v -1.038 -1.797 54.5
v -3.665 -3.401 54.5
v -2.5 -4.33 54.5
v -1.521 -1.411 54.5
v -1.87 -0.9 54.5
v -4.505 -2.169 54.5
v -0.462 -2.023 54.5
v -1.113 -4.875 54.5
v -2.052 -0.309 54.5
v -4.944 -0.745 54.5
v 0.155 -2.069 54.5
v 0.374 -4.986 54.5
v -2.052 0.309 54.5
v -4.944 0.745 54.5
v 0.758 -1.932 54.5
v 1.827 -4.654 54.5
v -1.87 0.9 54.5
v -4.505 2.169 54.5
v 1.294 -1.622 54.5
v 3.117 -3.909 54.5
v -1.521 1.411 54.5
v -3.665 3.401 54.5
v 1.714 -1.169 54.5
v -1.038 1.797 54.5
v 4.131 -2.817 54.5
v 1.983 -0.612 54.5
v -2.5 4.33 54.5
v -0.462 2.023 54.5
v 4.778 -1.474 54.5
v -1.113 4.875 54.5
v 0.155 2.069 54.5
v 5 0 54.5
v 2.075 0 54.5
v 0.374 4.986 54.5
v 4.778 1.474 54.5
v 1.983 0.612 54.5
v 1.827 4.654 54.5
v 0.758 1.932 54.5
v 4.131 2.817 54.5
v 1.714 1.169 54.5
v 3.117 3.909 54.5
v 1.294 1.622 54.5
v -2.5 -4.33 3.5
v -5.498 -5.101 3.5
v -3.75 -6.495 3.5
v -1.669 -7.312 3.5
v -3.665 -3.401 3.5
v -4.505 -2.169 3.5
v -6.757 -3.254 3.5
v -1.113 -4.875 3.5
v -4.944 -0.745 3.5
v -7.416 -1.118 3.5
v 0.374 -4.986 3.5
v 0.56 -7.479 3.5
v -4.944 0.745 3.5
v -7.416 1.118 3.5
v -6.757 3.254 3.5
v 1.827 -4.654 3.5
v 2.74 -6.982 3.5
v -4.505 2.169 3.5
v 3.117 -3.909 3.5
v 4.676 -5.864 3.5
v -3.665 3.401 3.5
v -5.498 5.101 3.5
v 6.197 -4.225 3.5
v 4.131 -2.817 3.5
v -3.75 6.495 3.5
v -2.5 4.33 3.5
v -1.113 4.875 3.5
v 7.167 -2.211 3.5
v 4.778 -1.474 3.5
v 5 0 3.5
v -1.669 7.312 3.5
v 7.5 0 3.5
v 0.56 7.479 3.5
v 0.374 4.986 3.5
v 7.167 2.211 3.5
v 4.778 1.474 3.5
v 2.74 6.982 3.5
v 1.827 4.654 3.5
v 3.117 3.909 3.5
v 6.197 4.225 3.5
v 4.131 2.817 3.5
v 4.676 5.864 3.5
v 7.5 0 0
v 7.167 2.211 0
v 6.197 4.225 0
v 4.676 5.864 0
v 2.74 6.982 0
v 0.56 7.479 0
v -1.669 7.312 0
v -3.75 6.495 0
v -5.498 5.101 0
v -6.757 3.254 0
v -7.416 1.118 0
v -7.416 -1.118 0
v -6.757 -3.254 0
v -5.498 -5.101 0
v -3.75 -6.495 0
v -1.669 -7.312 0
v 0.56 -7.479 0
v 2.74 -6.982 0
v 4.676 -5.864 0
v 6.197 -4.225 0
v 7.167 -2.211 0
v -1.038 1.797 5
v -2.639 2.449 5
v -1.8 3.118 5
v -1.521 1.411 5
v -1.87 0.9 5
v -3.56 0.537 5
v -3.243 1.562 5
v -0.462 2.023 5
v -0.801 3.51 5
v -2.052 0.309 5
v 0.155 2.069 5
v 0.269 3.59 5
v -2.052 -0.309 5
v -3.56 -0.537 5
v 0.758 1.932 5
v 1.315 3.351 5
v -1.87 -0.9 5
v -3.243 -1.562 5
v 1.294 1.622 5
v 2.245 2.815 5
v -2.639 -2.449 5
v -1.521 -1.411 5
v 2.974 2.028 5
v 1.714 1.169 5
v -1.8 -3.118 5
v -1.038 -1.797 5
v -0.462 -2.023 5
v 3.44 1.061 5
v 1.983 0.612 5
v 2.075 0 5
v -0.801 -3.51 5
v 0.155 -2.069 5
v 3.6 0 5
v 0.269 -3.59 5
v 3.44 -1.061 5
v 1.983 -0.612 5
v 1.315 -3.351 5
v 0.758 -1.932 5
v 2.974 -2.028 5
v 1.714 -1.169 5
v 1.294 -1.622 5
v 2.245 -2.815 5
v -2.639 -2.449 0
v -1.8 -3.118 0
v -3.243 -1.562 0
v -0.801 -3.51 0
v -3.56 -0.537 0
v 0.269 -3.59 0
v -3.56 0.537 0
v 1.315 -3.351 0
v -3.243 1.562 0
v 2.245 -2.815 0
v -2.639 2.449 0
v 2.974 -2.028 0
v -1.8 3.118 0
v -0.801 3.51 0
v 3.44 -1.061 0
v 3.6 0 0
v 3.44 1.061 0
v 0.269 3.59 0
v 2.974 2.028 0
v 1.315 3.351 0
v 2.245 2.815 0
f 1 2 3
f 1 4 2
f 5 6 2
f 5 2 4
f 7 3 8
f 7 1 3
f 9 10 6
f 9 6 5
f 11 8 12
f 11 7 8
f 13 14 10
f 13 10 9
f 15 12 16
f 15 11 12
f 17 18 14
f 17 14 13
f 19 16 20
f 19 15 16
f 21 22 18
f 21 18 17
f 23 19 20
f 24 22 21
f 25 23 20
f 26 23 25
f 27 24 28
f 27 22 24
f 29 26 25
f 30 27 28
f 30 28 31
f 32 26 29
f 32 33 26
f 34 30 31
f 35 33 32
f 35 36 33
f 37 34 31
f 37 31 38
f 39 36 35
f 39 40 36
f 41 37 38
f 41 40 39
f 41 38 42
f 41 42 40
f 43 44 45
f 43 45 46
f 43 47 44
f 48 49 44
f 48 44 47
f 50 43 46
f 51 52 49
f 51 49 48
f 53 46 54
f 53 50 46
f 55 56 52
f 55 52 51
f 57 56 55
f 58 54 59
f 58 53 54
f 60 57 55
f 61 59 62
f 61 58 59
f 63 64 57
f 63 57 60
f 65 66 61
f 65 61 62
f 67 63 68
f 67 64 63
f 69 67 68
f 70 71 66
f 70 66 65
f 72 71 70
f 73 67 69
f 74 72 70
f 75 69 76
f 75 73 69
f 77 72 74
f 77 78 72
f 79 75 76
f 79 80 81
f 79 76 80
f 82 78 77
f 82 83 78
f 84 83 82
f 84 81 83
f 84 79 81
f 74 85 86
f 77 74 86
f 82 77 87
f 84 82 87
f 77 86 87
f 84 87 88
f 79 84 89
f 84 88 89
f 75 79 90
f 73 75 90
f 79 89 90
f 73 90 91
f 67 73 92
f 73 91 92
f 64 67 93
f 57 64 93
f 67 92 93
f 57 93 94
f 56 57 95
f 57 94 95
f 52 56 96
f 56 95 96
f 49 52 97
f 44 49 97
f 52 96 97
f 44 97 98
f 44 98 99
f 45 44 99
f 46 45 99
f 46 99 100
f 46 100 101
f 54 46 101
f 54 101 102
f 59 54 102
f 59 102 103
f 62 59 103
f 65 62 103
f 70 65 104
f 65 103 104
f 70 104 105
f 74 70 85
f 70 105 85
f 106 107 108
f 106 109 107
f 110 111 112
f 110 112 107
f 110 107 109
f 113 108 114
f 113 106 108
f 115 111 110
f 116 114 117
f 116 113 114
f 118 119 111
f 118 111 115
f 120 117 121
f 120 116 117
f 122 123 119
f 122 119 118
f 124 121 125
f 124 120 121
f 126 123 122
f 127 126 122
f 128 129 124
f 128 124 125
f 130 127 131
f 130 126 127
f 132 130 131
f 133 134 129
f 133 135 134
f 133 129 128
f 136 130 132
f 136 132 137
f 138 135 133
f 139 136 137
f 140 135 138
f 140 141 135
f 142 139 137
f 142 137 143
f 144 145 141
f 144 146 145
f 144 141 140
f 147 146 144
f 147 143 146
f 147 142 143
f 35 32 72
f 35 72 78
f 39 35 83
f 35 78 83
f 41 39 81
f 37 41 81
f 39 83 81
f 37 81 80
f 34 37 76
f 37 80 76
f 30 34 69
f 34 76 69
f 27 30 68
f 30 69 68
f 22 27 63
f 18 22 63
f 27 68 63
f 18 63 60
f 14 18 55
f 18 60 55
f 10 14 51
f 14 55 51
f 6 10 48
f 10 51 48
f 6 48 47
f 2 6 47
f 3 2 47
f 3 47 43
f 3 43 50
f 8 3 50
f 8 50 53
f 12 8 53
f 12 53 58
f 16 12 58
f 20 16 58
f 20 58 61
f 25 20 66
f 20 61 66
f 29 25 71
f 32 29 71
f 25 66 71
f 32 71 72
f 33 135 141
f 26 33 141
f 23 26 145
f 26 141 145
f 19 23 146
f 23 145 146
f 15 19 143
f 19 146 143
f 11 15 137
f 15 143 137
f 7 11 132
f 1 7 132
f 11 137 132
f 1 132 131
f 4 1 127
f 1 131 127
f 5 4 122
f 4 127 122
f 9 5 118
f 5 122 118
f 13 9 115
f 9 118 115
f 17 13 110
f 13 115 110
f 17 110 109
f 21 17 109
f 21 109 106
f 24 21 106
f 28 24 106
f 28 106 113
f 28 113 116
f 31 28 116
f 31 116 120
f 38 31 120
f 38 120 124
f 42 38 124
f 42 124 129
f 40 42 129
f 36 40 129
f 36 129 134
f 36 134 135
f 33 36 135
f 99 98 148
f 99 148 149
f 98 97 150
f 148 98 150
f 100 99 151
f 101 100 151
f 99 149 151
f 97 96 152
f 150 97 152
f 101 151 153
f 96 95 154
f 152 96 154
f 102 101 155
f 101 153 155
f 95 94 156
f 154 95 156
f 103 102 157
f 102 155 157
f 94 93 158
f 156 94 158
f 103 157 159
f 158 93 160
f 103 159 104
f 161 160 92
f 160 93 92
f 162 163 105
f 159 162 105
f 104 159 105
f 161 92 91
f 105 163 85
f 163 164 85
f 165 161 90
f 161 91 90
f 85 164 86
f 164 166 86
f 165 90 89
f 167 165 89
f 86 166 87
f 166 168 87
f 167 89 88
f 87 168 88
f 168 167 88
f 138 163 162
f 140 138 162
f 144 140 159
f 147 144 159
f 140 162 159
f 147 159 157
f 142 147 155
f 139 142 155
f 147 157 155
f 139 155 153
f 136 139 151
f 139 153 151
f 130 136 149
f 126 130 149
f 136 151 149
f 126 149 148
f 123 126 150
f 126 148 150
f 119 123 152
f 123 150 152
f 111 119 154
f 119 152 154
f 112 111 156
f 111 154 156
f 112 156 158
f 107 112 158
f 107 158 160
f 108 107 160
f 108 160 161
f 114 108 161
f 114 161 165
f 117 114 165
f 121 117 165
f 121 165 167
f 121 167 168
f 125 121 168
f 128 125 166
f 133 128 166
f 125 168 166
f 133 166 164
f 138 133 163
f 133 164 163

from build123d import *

# Parameters (mm, degrees)
SKETCH_R        = 7.5
PAD_DEPTH       = 3.5
SKETCH001_R     = 5
PAD001_DEPTH    = 51
SKETCH002_R     = 2.075
POCKET_DEPTH    = 54.501
SKETCH003_R     = 3.6
POCKET001_DEPTH = 5


with BuildPart() as part:
    # Sketch → Pad (new body)
    with BuildSketch(Plane.XY):
        Circle(SKETCH_R)
    extrude(amount=PAD_DEPTH)

    # Sketch001 (on Face3 of Pad) → Pad001 (join)
    with BuildSketch(Plane.XY.offset(3.5)):
        Circle(SKETCH001_R)
    extrude(amount=PAD001_DEPTH)

    # Sketch002 (on Face2 of Pad001) → Pocket (cut, through all)
    with BuildSketch(Plane(origin=(0, 0, 0), x_dir=(1, 0, 0), z_dir=(0, 0, -1))):
        Circle(SKETCH002_R)
    extrude(amount=-POCKET_DEPTH, mode=Mode.SUBTRACT)

    # Sketch003 (on Face2 of Pocket) → Pocket001 (cut)
    with BuildSketch(Plane(origin=(0, 0, 0), x_dir=(1, 0, 0), z_dir=(0, 0, -1))):
        Circle(SKETCH003_R)
    extrude(amount=-POCKET001_DEPTH, mode=Mode.SUBTRACT)


solid = part.part
